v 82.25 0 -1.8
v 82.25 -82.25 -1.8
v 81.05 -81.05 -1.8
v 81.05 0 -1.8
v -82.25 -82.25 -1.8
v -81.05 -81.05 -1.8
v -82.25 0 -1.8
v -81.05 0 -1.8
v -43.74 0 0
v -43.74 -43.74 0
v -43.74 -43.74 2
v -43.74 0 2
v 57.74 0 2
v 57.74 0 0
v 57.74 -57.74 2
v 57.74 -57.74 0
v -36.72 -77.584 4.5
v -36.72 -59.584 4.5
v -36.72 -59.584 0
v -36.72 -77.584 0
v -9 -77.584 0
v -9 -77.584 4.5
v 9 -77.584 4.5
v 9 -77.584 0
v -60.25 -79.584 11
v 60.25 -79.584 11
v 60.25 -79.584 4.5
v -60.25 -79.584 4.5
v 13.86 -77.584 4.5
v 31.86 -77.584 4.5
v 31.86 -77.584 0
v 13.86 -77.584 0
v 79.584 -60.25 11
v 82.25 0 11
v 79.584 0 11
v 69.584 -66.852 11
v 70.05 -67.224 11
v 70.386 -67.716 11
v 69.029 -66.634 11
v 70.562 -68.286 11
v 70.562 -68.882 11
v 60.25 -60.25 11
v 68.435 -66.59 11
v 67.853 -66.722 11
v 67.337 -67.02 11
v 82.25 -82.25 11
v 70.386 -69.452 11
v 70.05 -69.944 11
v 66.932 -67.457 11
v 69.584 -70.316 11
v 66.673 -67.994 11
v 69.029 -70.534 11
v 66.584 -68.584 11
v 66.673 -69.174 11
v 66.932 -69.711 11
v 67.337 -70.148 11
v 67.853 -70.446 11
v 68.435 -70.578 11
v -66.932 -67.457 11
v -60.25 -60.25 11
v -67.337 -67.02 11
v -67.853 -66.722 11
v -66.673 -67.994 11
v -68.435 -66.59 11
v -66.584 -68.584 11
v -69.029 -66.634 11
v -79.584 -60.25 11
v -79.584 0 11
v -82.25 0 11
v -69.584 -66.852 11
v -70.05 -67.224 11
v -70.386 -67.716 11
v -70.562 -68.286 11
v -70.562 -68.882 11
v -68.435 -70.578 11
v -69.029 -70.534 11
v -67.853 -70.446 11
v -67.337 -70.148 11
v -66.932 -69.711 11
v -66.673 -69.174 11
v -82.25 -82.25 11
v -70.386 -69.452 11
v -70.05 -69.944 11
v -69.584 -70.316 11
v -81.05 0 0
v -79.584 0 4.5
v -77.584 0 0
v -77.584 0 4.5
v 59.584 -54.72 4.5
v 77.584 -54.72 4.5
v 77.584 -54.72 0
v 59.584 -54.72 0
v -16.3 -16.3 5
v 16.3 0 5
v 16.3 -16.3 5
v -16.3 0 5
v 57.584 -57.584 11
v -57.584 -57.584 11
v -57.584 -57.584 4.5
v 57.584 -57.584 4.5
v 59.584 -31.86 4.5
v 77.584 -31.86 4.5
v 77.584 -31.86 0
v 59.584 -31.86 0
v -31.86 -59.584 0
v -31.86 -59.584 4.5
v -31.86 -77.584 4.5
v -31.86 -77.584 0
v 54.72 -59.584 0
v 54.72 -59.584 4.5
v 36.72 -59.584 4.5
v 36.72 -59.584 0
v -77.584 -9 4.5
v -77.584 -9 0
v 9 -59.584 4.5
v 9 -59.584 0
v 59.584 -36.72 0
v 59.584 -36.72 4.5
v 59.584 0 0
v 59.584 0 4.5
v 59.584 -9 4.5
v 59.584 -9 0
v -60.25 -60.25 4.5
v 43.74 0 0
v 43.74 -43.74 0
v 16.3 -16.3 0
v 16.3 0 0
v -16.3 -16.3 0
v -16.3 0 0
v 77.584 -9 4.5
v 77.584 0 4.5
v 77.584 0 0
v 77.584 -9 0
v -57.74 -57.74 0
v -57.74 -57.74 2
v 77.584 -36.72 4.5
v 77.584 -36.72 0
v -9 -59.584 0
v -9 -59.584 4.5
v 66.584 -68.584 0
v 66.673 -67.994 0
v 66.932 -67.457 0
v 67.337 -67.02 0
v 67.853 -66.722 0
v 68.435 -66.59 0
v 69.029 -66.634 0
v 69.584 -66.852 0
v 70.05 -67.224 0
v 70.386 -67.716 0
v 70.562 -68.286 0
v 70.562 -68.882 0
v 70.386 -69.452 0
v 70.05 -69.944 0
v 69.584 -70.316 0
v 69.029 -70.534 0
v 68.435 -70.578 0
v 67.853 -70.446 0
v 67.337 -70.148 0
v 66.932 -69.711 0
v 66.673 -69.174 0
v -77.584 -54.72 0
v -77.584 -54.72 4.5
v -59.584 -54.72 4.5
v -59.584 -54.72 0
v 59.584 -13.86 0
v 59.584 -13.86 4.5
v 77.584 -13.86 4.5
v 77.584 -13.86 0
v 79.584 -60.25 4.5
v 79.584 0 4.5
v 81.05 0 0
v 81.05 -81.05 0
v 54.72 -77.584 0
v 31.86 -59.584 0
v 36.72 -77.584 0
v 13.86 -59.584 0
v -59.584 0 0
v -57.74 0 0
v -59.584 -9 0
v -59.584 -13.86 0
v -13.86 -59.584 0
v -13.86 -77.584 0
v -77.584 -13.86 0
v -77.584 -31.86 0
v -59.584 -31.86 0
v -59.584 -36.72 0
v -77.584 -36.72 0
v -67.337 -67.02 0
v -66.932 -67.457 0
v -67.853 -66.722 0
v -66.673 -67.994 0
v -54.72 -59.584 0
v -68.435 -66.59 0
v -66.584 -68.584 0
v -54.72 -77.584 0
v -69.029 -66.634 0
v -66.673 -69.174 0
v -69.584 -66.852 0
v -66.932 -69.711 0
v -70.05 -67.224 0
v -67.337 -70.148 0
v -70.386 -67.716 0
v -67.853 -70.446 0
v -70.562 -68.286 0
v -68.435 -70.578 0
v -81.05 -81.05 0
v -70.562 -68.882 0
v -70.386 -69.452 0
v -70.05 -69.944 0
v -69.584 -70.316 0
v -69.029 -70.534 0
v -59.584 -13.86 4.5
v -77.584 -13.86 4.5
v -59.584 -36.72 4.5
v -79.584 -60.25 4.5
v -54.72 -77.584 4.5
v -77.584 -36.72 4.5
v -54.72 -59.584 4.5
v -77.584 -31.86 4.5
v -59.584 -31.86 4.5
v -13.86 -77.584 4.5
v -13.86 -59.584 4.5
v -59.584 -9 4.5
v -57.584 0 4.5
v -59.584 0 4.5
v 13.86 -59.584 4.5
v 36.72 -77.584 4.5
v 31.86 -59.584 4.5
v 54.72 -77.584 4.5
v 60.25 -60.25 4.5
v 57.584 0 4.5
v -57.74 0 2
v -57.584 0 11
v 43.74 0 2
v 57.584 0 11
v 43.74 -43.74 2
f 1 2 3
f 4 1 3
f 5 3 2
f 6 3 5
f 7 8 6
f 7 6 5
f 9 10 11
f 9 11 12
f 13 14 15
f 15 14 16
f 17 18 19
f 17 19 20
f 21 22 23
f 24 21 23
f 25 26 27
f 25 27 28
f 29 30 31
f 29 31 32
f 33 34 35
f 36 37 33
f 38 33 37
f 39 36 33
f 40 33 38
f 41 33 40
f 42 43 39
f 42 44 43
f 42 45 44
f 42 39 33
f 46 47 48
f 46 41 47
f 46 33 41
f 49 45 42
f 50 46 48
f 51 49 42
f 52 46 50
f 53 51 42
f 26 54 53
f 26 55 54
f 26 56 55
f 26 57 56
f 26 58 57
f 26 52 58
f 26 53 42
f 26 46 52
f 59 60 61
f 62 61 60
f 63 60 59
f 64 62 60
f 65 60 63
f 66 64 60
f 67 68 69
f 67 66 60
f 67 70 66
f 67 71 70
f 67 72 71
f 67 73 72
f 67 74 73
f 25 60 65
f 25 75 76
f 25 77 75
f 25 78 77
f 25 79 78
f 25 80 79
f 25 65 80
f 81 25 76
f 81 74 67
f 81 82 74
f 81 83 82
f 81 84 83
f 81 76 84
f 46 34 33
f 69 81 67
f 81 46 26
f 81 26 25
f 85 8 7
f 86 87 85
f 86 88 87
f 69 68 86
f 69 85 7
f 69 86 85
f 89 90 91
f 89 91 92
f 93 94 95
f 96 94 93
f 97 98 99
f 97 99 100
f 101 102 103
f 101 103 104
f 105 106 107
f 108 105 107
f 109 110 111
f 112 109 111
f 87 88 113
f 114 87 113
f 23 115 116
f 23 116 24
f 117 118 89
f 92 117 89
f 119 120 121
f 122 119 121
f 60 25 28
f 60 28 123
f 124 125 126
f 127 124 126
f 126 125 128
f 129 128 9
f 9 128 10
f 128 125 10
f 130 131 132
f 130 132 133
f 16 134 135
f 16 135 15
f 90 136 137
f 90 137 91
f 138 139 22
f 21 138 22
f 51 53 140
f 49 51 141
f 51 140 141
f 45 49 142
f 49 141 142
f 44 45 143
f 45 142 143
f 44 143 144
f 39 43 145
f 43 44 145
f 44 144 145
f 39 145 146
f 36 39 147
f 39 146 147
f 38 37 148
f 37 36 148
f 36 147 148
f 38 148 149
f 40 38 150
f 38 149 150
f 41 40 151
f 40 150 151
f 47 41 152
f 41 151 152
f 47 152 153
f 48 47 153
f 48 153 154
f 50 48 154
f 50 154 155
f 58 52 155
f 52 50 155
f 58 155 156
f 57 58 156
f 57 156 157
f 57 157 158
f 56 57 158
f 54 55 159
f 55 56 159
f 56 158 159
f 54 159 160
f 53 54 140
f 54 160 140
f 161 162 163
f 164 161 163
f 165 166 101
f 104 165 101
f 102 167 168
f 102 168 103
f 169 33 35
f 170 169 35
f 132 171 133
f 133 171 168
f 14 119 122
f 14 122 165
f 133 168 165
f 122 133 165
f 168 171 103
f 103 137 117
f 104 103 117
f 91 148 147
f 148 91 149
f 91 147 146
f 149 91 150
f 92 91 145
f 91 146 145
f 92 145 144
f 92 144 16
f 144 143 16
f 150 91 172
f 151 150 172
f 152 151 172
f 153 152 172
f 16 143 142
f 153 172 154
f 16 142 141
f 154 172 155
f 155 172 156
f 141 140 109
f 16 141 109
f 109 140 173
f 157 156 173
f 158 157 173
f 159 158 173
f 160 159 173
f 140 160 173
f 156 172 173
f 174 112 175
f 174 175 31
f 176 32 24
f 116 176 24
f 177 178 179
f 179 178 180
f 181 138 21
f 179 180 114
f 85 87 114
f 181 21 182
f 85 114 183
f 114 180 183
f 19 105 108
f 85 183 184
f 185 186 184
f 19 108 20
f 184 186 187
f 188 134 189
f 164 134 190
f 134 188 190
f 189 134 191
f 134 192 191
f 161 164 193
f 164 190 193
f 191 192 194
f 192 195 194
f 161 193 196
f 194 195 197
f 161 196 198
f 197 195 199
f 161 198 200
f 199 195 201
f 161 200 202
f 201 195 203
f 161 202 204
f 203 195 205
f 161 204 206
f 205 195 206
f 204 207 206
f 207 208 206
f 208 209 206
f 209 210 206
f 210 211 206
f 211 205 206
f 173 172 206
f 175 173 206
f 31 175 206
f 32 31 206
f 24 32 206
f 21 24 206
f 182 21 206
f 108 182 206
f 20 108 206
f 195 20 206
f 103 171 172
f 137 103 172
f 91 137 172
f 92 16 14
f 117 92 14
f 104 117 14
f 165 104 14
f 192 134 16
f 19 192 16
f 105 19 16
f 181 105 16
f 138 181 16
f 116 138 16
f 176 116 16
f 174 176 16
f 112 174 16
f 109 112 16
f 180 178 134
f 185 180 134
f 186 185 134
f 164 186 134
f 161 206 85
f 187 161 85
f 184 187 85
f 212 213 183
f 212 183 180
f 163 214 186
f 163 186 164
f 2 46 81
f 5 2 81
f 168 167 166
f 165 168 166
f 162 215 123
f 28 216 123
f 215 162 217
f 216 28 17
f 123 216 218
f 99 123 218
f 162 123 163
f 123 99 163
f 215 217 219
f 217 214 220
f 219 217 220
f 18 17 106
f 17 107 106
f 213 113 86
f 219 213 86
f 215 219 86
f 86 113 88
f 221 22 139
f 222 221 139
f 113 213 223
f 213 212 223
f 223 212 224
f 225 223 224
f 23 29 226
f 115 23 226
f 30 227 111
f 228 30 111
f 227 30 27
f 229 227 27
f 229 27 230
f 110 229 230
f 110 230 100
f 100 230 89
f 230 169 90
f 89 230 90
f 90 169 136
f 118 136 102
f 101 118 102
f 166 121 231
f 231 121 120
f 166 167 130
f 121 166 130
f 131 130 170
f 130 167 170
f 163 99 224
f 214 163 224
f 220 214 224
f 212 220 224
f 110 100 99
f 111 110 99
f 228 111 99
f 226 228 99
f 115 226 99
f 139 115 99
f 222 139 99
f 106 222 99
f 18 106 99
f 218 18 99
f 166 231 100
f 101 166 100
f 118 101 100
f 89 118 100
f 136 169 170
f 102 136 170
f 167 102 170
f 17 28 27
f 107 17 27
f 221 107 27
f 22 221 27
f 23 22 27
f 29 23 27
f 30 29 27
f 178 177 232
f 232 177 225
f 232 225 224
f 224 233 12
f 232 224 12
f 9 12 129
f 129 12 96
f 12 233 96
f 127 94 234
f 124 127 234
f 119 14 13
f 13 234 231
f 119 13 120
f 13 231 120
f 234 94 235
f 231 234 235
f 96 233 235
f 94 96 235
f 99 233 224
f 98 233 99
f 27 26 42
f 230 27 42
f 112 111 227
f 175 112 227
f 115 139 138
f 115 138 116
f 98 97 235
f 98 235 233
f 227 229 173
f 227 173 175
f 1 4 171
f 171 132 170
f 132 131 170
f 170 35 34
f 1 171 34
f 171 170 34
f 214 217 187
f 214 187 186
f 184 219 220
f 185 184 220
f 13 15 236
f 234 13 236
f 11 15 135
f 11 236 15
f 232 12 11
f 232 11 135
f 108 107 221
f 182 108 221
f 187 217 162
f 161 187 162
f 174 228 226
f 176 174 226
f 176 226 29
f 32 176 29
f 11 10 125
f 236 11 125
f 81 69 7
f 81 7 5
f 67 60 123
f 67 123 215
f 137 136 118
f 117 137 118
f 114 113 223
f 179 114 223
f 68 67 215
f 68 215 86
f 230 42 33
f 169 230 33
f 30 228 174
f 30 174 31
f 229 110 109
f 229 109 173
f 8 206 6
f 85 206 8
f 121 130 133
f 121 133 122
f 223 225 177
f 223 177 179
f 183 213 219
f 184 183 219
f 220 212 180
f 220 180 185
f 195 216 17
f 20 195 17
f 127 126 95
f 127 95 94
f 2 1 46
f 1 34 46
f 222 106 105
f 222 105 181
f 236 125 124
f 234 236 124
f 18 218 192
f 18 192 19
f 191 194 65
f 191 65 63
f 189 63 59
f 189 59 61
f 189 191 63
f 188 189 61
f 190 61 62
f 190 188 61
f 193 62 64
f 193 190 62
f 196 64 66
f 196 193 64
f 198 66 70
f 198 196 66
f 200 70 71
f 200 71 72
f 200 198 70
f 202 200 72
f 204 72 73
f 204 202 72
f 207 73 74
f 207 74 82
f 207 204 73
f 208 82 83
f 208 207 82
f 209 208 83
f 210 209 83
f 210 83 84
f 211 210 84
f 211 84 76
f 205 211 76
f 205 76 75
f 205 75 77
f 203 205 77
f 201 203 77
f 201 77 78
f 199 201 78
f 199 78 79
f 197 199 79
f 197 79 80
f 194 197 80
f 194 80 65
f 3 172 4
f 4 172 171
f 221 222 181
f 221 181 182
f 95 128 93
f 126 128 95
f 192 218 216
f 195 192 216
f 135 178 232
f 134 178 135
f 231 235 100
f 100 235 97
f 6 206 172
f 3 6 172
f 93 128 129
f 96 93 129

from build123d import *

# Parameters (mm, degrees)
SKETCH_W        = 82.25
SKETCH_H        = 82.25
PAD_DEPTH       = 11
PAD001_DEPTH    = 1.8
POCKET_DEPTH    = 6.5
SKETCH003_W     = 18
SKETCH003_H     = 18
SKETCH003_W_2   = 9
SKETCH003_H_2   = 9
POCKET001_DEPTH = 5
SKETCH004_R     = 2
POCKET002_DEPTH = 13
POCKET003_DEPTH = 2
SKETCH006_W     = 16.3
SKETCH006_H     = 16.3
POCKET004_DEPTH = 5


with BuildPart() as body:
    # Sketch → Pad (new body)
    with BuildSketch(Plane.XY):
        with Locations((-41.125, 41.125)):
            Rectangle(SKETCH_W, SKETCH_H)
    pad = extrude(amount=PAD_DEPTH)

    # Sketch001 (on Face5 of Pad) → Pad001 (join)
    with BuildSketch(Plane(origin=(0, 0, 0), x_dir=(1, 0, 0), z_dir=(0, 0, -1))):
        Polygon((-82.25, 0), (-82.25, -82.25), (0, -82.25), (0, -81.05), (-81.05, -81.05), (-81.05, 0), align=None)
    pad001 = extrude(amount=PAD001_DEPTH)

    # Sketch002 (on Face6 of Pad001) → Pocket (cut)
    with BuildSketch(Plane(origin=(0, 0, 11), x_dir=(0, -1, 0), z_dir=(0, 0, 1))):
        Polygon((-79.584, 0), (-79.584, -60.25), (-60.25, -60.25), (-60.25, -79.584), (0, -79.584), (0, -57.584), (-57.584, -57.584), (-57.584, 0), align=None)
    pocket = extrude(amount=-POCKET_DEPTH, mode=Mode.SUBTRACT)

    # Sketch003 (on Face7 of Pocket) → Pocket001 (cut)
    with BuildSketch(Plane.XY.offset(4.5)):
        with Locations((-45.72, 68.584)):
            Rectangle(SKETCH003_W, SKETCH003_H)
        with Locations((-22.86, 68.584)):
            Rectangle(SKETCH003_W, SKETCH003_H)
        with Locations((-4.5, 68.584)):
            Rectangle(SKETCH003_W_2, SKETCH003_H)
        with Locations((-68.584, 4.5)):
            Rectangle(SKETCH003_W, SKETCH003_H_2)
        with Locations((-68.584, 22.86)):
            Rectangle(SKETCH003_W, SKETCH003_H)
        with Locations((-68.584, 45.72)):
            Rectangle(SKETCH003_W, SKETCH003_H)
    pocket001 = extrude(amount=-POCKET001_DEPTH, mode=Mode.SUBTRACT)

    # Sketch004 (on Face2 of Pocket001) → Pocket002 (cut)
    with BuildSketch(Plane(origin=(0, 0, 0), x_dir=(1, 0, 0), z_dir=(0, 0, -1))):
        with Locations((-68.584, -68.584)):
            Circle(SKETCH004_R)
    pocket002 = extrude(amount=-POCKET002_DEPTH, mode=Mode.SUBTRACT)

    # Sketch005 (on Face2 of Pocket002) → Pocket003 (cut)
    with BuildSketch(Plane(origin=(0, 0, 0), x_dir=(1, 0, 0), z_dir=(0, 0, -1))):
        Polygon((-57.74, 0), (-57.74, -57.74), (0, -57.74), (0, -43.74), (-43.74, -43.74), (-43.74, 0), align=None)
    pocket003 = extrude(amount=-POCKET003_DEPTH, mode=Mode.SUBTRACT)

    # Sketch006 (on Face2 of Pocket003) → Pocket004 (cut)
    with BuildSketch(Plane(origin=(0, 0, 0), x_dir=(1, 0, 0), z_dir=(0, 0, -1))):
        with Locations((-8.15, -8.15)):
            Rectangle(SKETCH006_W, SKETCH006_H)
    pocket004 = extrude(amount=-POCKET004_DEPTH, mode=Mode.SUBTRACT)

    # Mirrored: Pad, Pad001, Pocket, Pocket001, Pocket002, Pocket003, Pocket004 across YZ
    add(pad.mirror(Plane.YZ))
    add(pad001.mirror(Plane.YZ))
    add(pocket.mirror(Plane.YZ), mode=Mode.SUBTRACT)
    add(pocket001.mirror(Plane.YZ), mode=Mode.SUBTRACT)
    add(pocket002.mirror(Plane.YZ), mode=Mode.SUBTRACT)
    add(pocket003.mirror(Plane.YZ), mode=Mode.SUBTRACT)
    add(pocket004.mirror(Plane.YZ), mode=Mode.SUBTRACT)


with BuildPart() as part_mirroring:
    # Part__Mirroring: instance of Body
    add(body.part.mirror(Plane(origin=(0, 0, 0), x_dir=(1, 0, 0), z_dir=(0, 1, 0))))


solid = part_mirroring.part
